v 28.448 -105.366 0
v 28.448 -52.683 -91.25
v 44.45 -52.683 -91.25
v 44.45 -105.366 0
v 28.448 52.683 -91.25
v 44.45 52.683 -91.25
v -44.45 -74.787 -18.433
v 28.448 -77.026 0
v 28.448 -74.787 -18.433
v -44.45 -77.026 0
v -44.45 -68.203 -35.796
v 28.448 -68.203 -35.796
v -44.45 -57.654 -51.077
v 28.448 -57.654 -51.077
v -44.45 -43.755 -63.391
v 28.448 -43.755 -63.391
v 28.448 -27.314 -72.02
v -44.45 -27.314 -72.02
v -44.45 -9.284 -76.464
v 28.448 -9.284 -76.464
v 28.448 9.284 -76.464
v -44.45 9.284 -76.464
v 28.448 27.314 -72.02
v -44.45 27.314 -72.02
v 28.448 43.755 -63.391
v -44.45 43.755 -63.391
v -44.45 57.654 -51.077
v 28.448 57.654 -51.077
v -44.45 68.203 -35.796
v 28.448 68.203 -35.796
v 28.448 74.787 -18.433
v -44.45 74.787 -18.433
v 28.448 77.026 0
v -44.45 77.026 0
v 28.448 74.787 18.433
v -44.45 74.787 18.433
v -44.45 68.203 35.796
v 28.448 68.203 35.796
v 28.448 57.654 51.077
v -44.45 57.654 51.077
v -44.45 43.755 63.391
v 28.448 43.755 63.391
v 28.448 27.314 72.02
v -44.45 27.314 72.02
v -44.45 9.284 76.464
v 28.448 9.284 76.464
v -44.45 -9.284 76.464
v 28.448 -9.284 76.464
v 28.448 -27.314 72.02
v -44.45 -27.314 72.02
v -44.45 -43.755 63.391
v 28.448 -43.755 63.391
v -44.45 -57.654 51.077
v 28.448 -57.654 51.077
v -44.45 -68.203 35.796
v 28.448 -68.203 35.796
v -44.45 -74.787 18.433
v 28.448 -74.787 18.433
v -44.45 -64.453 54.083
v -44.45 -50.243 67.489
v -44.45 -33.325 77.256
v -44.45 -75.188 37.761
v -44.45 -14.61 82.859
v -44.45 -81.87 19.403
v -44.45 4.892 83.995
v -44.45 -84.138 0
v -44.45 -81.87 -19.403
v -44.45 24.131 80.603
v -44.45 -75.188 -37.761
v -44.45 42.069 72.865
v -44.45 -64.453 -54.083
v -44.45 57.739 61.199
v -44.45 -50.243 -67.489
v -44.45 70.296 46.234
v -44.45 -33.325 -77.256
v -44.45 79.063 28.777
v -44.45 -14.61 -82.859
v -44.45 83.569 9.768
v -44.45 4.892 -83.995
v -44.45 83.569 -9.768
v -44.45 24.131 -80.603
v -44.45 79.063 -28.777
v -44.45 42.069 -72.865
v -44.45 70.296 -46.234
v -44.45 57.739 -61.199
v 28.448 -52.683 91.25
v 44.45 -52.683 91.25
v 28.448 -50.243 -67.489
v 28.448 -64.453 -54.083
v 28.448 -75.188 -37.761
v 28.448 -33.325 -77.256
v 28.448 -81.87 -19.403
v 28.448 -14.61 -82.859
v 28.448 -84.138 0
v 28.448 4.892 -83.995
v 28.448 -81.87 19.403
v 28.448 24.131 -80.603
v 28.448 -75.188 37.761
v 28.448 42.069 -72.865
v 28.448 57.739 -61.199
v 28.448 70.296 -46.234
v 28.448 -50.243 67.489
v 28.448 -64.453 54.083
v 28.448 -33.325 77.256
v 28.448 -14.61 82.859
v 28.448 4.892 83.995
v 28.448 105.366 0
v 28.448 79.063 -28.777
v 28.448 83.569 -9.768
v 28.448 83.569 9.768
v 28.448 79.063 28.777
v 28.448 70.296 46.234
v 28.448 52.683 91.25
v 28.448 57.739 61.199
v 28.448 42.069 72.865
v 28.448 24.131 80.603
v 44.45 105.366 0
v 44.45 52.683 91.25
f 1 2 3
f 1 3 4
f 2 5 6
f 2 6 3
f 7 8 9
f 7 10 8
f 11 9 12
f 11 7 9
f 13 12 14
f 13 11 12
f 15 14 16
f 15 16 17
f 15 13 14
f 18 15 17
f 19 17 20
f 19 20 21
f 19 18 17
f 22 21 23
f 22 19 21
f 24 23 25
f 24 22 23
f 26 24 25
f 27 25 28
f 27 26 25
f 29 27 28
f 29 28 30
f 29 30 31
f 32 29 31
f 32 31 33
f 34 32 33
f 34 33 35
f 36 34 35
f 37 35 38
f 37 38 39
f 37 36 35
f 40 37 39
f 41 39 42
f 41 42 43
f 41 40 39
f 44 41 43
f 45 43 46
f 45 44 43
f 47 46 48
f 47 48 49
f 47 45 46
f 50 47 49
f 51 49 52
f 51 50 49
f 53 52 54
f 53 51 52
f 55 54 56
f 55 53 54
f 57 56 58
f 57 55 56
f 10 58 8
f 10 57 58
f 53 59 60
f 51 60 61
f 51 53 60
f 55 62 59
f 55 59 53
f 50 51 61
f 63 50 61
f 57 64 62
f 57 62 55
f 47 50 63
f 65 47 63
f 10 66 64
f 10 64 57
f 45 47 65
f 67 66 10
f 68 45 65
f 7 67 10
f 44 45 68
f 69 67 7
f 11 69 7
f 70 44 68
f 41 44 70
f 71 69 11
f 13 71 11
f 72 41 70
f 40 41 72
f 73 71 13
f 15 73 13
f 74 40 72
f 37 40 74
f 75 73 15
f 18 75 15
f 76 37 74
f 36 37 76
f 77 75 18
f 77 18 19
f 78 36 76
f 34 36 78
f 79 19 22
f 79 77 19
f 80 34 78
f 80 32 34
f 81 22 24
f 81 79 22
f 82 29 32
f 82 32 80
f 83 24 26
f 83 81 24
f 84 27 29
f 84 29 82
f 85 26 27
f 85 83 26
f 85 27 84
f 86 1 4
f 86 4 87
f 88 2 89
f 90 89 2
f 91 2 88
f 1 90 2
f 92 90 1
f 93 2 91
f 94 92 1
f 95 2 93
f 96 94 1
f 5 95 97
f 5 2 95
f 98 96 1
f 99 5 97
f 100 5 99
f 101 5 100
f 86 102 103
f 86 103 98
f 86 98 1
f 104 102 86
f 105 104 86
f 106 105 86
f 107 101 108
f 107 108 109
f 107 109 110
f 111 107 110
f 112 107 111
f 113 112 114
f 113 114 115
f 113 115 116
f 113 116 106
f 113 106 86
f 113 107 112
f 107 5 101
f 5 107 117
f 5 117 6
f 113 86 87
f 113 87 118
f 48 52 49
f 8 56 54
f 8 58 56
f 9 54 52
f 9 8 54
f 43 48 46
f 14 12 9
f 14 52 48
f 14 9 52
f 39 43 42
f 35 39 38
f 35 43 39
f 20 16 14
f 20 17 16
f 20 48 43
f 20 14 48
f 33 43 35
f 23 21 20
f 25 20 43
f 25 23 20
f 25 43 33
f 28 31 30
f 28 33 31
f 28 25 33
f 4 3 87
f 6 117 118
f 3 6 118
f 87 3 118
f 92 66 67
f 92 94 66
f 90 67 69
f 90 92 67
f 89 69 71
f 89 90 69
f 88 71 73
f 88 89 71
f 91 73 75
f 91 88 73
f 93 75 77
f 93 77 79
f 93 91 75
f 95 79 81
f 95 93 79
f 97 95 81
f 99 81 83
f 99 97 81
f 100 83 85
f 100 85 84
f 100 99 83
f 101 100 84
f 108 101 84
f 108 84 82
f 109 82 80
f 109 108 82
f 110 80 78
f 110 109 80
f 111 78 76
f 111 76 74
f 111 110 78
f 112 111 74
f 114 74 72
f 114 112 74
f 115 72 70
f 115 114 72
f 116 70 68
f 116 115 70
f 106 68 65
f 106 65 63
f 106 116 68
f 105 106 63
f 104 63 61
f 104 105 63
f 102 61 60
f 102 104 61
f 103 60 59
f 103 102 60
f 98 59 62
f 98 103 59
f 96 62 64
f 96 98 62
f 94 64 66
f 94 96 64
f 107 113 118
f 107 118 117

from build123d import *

# Parameters (mm, degrees)
BOSS_EXTRUDE1_DEPTH = 16.002


with BuildPart() as part:
    # Sketch1 → Revolve1 (revolve)
    with BuildSketch(Plane.XY):
        Polygon((-44.45, -84.1375), (28.448, -84.1375), (28.448, -91.2495), (44.45, -91.2495), (44.45, 0), (28.448, 0), (28.448, -77.0255), (-44.45, -77.0255), align=None)
    revolve(axis=Axis((-44.45, 0, 0), (1, 0, 0)))

    # Sketch2 → Boss-Extrude1 (add)
    with BuildSketch(Plane.ZY.offset(-28.448)):
        Polygon((-91.2495, 52.682923388), (-91.2495, -52.682923388), (0, -105.365846777), (91.2495, -52.682923388), (91.2495, 52.682923388), (0, 105.365846777), align=None)
    extrude(amount=-BOSS_EXTRUDE1_DEPTH)


solid = part.part
